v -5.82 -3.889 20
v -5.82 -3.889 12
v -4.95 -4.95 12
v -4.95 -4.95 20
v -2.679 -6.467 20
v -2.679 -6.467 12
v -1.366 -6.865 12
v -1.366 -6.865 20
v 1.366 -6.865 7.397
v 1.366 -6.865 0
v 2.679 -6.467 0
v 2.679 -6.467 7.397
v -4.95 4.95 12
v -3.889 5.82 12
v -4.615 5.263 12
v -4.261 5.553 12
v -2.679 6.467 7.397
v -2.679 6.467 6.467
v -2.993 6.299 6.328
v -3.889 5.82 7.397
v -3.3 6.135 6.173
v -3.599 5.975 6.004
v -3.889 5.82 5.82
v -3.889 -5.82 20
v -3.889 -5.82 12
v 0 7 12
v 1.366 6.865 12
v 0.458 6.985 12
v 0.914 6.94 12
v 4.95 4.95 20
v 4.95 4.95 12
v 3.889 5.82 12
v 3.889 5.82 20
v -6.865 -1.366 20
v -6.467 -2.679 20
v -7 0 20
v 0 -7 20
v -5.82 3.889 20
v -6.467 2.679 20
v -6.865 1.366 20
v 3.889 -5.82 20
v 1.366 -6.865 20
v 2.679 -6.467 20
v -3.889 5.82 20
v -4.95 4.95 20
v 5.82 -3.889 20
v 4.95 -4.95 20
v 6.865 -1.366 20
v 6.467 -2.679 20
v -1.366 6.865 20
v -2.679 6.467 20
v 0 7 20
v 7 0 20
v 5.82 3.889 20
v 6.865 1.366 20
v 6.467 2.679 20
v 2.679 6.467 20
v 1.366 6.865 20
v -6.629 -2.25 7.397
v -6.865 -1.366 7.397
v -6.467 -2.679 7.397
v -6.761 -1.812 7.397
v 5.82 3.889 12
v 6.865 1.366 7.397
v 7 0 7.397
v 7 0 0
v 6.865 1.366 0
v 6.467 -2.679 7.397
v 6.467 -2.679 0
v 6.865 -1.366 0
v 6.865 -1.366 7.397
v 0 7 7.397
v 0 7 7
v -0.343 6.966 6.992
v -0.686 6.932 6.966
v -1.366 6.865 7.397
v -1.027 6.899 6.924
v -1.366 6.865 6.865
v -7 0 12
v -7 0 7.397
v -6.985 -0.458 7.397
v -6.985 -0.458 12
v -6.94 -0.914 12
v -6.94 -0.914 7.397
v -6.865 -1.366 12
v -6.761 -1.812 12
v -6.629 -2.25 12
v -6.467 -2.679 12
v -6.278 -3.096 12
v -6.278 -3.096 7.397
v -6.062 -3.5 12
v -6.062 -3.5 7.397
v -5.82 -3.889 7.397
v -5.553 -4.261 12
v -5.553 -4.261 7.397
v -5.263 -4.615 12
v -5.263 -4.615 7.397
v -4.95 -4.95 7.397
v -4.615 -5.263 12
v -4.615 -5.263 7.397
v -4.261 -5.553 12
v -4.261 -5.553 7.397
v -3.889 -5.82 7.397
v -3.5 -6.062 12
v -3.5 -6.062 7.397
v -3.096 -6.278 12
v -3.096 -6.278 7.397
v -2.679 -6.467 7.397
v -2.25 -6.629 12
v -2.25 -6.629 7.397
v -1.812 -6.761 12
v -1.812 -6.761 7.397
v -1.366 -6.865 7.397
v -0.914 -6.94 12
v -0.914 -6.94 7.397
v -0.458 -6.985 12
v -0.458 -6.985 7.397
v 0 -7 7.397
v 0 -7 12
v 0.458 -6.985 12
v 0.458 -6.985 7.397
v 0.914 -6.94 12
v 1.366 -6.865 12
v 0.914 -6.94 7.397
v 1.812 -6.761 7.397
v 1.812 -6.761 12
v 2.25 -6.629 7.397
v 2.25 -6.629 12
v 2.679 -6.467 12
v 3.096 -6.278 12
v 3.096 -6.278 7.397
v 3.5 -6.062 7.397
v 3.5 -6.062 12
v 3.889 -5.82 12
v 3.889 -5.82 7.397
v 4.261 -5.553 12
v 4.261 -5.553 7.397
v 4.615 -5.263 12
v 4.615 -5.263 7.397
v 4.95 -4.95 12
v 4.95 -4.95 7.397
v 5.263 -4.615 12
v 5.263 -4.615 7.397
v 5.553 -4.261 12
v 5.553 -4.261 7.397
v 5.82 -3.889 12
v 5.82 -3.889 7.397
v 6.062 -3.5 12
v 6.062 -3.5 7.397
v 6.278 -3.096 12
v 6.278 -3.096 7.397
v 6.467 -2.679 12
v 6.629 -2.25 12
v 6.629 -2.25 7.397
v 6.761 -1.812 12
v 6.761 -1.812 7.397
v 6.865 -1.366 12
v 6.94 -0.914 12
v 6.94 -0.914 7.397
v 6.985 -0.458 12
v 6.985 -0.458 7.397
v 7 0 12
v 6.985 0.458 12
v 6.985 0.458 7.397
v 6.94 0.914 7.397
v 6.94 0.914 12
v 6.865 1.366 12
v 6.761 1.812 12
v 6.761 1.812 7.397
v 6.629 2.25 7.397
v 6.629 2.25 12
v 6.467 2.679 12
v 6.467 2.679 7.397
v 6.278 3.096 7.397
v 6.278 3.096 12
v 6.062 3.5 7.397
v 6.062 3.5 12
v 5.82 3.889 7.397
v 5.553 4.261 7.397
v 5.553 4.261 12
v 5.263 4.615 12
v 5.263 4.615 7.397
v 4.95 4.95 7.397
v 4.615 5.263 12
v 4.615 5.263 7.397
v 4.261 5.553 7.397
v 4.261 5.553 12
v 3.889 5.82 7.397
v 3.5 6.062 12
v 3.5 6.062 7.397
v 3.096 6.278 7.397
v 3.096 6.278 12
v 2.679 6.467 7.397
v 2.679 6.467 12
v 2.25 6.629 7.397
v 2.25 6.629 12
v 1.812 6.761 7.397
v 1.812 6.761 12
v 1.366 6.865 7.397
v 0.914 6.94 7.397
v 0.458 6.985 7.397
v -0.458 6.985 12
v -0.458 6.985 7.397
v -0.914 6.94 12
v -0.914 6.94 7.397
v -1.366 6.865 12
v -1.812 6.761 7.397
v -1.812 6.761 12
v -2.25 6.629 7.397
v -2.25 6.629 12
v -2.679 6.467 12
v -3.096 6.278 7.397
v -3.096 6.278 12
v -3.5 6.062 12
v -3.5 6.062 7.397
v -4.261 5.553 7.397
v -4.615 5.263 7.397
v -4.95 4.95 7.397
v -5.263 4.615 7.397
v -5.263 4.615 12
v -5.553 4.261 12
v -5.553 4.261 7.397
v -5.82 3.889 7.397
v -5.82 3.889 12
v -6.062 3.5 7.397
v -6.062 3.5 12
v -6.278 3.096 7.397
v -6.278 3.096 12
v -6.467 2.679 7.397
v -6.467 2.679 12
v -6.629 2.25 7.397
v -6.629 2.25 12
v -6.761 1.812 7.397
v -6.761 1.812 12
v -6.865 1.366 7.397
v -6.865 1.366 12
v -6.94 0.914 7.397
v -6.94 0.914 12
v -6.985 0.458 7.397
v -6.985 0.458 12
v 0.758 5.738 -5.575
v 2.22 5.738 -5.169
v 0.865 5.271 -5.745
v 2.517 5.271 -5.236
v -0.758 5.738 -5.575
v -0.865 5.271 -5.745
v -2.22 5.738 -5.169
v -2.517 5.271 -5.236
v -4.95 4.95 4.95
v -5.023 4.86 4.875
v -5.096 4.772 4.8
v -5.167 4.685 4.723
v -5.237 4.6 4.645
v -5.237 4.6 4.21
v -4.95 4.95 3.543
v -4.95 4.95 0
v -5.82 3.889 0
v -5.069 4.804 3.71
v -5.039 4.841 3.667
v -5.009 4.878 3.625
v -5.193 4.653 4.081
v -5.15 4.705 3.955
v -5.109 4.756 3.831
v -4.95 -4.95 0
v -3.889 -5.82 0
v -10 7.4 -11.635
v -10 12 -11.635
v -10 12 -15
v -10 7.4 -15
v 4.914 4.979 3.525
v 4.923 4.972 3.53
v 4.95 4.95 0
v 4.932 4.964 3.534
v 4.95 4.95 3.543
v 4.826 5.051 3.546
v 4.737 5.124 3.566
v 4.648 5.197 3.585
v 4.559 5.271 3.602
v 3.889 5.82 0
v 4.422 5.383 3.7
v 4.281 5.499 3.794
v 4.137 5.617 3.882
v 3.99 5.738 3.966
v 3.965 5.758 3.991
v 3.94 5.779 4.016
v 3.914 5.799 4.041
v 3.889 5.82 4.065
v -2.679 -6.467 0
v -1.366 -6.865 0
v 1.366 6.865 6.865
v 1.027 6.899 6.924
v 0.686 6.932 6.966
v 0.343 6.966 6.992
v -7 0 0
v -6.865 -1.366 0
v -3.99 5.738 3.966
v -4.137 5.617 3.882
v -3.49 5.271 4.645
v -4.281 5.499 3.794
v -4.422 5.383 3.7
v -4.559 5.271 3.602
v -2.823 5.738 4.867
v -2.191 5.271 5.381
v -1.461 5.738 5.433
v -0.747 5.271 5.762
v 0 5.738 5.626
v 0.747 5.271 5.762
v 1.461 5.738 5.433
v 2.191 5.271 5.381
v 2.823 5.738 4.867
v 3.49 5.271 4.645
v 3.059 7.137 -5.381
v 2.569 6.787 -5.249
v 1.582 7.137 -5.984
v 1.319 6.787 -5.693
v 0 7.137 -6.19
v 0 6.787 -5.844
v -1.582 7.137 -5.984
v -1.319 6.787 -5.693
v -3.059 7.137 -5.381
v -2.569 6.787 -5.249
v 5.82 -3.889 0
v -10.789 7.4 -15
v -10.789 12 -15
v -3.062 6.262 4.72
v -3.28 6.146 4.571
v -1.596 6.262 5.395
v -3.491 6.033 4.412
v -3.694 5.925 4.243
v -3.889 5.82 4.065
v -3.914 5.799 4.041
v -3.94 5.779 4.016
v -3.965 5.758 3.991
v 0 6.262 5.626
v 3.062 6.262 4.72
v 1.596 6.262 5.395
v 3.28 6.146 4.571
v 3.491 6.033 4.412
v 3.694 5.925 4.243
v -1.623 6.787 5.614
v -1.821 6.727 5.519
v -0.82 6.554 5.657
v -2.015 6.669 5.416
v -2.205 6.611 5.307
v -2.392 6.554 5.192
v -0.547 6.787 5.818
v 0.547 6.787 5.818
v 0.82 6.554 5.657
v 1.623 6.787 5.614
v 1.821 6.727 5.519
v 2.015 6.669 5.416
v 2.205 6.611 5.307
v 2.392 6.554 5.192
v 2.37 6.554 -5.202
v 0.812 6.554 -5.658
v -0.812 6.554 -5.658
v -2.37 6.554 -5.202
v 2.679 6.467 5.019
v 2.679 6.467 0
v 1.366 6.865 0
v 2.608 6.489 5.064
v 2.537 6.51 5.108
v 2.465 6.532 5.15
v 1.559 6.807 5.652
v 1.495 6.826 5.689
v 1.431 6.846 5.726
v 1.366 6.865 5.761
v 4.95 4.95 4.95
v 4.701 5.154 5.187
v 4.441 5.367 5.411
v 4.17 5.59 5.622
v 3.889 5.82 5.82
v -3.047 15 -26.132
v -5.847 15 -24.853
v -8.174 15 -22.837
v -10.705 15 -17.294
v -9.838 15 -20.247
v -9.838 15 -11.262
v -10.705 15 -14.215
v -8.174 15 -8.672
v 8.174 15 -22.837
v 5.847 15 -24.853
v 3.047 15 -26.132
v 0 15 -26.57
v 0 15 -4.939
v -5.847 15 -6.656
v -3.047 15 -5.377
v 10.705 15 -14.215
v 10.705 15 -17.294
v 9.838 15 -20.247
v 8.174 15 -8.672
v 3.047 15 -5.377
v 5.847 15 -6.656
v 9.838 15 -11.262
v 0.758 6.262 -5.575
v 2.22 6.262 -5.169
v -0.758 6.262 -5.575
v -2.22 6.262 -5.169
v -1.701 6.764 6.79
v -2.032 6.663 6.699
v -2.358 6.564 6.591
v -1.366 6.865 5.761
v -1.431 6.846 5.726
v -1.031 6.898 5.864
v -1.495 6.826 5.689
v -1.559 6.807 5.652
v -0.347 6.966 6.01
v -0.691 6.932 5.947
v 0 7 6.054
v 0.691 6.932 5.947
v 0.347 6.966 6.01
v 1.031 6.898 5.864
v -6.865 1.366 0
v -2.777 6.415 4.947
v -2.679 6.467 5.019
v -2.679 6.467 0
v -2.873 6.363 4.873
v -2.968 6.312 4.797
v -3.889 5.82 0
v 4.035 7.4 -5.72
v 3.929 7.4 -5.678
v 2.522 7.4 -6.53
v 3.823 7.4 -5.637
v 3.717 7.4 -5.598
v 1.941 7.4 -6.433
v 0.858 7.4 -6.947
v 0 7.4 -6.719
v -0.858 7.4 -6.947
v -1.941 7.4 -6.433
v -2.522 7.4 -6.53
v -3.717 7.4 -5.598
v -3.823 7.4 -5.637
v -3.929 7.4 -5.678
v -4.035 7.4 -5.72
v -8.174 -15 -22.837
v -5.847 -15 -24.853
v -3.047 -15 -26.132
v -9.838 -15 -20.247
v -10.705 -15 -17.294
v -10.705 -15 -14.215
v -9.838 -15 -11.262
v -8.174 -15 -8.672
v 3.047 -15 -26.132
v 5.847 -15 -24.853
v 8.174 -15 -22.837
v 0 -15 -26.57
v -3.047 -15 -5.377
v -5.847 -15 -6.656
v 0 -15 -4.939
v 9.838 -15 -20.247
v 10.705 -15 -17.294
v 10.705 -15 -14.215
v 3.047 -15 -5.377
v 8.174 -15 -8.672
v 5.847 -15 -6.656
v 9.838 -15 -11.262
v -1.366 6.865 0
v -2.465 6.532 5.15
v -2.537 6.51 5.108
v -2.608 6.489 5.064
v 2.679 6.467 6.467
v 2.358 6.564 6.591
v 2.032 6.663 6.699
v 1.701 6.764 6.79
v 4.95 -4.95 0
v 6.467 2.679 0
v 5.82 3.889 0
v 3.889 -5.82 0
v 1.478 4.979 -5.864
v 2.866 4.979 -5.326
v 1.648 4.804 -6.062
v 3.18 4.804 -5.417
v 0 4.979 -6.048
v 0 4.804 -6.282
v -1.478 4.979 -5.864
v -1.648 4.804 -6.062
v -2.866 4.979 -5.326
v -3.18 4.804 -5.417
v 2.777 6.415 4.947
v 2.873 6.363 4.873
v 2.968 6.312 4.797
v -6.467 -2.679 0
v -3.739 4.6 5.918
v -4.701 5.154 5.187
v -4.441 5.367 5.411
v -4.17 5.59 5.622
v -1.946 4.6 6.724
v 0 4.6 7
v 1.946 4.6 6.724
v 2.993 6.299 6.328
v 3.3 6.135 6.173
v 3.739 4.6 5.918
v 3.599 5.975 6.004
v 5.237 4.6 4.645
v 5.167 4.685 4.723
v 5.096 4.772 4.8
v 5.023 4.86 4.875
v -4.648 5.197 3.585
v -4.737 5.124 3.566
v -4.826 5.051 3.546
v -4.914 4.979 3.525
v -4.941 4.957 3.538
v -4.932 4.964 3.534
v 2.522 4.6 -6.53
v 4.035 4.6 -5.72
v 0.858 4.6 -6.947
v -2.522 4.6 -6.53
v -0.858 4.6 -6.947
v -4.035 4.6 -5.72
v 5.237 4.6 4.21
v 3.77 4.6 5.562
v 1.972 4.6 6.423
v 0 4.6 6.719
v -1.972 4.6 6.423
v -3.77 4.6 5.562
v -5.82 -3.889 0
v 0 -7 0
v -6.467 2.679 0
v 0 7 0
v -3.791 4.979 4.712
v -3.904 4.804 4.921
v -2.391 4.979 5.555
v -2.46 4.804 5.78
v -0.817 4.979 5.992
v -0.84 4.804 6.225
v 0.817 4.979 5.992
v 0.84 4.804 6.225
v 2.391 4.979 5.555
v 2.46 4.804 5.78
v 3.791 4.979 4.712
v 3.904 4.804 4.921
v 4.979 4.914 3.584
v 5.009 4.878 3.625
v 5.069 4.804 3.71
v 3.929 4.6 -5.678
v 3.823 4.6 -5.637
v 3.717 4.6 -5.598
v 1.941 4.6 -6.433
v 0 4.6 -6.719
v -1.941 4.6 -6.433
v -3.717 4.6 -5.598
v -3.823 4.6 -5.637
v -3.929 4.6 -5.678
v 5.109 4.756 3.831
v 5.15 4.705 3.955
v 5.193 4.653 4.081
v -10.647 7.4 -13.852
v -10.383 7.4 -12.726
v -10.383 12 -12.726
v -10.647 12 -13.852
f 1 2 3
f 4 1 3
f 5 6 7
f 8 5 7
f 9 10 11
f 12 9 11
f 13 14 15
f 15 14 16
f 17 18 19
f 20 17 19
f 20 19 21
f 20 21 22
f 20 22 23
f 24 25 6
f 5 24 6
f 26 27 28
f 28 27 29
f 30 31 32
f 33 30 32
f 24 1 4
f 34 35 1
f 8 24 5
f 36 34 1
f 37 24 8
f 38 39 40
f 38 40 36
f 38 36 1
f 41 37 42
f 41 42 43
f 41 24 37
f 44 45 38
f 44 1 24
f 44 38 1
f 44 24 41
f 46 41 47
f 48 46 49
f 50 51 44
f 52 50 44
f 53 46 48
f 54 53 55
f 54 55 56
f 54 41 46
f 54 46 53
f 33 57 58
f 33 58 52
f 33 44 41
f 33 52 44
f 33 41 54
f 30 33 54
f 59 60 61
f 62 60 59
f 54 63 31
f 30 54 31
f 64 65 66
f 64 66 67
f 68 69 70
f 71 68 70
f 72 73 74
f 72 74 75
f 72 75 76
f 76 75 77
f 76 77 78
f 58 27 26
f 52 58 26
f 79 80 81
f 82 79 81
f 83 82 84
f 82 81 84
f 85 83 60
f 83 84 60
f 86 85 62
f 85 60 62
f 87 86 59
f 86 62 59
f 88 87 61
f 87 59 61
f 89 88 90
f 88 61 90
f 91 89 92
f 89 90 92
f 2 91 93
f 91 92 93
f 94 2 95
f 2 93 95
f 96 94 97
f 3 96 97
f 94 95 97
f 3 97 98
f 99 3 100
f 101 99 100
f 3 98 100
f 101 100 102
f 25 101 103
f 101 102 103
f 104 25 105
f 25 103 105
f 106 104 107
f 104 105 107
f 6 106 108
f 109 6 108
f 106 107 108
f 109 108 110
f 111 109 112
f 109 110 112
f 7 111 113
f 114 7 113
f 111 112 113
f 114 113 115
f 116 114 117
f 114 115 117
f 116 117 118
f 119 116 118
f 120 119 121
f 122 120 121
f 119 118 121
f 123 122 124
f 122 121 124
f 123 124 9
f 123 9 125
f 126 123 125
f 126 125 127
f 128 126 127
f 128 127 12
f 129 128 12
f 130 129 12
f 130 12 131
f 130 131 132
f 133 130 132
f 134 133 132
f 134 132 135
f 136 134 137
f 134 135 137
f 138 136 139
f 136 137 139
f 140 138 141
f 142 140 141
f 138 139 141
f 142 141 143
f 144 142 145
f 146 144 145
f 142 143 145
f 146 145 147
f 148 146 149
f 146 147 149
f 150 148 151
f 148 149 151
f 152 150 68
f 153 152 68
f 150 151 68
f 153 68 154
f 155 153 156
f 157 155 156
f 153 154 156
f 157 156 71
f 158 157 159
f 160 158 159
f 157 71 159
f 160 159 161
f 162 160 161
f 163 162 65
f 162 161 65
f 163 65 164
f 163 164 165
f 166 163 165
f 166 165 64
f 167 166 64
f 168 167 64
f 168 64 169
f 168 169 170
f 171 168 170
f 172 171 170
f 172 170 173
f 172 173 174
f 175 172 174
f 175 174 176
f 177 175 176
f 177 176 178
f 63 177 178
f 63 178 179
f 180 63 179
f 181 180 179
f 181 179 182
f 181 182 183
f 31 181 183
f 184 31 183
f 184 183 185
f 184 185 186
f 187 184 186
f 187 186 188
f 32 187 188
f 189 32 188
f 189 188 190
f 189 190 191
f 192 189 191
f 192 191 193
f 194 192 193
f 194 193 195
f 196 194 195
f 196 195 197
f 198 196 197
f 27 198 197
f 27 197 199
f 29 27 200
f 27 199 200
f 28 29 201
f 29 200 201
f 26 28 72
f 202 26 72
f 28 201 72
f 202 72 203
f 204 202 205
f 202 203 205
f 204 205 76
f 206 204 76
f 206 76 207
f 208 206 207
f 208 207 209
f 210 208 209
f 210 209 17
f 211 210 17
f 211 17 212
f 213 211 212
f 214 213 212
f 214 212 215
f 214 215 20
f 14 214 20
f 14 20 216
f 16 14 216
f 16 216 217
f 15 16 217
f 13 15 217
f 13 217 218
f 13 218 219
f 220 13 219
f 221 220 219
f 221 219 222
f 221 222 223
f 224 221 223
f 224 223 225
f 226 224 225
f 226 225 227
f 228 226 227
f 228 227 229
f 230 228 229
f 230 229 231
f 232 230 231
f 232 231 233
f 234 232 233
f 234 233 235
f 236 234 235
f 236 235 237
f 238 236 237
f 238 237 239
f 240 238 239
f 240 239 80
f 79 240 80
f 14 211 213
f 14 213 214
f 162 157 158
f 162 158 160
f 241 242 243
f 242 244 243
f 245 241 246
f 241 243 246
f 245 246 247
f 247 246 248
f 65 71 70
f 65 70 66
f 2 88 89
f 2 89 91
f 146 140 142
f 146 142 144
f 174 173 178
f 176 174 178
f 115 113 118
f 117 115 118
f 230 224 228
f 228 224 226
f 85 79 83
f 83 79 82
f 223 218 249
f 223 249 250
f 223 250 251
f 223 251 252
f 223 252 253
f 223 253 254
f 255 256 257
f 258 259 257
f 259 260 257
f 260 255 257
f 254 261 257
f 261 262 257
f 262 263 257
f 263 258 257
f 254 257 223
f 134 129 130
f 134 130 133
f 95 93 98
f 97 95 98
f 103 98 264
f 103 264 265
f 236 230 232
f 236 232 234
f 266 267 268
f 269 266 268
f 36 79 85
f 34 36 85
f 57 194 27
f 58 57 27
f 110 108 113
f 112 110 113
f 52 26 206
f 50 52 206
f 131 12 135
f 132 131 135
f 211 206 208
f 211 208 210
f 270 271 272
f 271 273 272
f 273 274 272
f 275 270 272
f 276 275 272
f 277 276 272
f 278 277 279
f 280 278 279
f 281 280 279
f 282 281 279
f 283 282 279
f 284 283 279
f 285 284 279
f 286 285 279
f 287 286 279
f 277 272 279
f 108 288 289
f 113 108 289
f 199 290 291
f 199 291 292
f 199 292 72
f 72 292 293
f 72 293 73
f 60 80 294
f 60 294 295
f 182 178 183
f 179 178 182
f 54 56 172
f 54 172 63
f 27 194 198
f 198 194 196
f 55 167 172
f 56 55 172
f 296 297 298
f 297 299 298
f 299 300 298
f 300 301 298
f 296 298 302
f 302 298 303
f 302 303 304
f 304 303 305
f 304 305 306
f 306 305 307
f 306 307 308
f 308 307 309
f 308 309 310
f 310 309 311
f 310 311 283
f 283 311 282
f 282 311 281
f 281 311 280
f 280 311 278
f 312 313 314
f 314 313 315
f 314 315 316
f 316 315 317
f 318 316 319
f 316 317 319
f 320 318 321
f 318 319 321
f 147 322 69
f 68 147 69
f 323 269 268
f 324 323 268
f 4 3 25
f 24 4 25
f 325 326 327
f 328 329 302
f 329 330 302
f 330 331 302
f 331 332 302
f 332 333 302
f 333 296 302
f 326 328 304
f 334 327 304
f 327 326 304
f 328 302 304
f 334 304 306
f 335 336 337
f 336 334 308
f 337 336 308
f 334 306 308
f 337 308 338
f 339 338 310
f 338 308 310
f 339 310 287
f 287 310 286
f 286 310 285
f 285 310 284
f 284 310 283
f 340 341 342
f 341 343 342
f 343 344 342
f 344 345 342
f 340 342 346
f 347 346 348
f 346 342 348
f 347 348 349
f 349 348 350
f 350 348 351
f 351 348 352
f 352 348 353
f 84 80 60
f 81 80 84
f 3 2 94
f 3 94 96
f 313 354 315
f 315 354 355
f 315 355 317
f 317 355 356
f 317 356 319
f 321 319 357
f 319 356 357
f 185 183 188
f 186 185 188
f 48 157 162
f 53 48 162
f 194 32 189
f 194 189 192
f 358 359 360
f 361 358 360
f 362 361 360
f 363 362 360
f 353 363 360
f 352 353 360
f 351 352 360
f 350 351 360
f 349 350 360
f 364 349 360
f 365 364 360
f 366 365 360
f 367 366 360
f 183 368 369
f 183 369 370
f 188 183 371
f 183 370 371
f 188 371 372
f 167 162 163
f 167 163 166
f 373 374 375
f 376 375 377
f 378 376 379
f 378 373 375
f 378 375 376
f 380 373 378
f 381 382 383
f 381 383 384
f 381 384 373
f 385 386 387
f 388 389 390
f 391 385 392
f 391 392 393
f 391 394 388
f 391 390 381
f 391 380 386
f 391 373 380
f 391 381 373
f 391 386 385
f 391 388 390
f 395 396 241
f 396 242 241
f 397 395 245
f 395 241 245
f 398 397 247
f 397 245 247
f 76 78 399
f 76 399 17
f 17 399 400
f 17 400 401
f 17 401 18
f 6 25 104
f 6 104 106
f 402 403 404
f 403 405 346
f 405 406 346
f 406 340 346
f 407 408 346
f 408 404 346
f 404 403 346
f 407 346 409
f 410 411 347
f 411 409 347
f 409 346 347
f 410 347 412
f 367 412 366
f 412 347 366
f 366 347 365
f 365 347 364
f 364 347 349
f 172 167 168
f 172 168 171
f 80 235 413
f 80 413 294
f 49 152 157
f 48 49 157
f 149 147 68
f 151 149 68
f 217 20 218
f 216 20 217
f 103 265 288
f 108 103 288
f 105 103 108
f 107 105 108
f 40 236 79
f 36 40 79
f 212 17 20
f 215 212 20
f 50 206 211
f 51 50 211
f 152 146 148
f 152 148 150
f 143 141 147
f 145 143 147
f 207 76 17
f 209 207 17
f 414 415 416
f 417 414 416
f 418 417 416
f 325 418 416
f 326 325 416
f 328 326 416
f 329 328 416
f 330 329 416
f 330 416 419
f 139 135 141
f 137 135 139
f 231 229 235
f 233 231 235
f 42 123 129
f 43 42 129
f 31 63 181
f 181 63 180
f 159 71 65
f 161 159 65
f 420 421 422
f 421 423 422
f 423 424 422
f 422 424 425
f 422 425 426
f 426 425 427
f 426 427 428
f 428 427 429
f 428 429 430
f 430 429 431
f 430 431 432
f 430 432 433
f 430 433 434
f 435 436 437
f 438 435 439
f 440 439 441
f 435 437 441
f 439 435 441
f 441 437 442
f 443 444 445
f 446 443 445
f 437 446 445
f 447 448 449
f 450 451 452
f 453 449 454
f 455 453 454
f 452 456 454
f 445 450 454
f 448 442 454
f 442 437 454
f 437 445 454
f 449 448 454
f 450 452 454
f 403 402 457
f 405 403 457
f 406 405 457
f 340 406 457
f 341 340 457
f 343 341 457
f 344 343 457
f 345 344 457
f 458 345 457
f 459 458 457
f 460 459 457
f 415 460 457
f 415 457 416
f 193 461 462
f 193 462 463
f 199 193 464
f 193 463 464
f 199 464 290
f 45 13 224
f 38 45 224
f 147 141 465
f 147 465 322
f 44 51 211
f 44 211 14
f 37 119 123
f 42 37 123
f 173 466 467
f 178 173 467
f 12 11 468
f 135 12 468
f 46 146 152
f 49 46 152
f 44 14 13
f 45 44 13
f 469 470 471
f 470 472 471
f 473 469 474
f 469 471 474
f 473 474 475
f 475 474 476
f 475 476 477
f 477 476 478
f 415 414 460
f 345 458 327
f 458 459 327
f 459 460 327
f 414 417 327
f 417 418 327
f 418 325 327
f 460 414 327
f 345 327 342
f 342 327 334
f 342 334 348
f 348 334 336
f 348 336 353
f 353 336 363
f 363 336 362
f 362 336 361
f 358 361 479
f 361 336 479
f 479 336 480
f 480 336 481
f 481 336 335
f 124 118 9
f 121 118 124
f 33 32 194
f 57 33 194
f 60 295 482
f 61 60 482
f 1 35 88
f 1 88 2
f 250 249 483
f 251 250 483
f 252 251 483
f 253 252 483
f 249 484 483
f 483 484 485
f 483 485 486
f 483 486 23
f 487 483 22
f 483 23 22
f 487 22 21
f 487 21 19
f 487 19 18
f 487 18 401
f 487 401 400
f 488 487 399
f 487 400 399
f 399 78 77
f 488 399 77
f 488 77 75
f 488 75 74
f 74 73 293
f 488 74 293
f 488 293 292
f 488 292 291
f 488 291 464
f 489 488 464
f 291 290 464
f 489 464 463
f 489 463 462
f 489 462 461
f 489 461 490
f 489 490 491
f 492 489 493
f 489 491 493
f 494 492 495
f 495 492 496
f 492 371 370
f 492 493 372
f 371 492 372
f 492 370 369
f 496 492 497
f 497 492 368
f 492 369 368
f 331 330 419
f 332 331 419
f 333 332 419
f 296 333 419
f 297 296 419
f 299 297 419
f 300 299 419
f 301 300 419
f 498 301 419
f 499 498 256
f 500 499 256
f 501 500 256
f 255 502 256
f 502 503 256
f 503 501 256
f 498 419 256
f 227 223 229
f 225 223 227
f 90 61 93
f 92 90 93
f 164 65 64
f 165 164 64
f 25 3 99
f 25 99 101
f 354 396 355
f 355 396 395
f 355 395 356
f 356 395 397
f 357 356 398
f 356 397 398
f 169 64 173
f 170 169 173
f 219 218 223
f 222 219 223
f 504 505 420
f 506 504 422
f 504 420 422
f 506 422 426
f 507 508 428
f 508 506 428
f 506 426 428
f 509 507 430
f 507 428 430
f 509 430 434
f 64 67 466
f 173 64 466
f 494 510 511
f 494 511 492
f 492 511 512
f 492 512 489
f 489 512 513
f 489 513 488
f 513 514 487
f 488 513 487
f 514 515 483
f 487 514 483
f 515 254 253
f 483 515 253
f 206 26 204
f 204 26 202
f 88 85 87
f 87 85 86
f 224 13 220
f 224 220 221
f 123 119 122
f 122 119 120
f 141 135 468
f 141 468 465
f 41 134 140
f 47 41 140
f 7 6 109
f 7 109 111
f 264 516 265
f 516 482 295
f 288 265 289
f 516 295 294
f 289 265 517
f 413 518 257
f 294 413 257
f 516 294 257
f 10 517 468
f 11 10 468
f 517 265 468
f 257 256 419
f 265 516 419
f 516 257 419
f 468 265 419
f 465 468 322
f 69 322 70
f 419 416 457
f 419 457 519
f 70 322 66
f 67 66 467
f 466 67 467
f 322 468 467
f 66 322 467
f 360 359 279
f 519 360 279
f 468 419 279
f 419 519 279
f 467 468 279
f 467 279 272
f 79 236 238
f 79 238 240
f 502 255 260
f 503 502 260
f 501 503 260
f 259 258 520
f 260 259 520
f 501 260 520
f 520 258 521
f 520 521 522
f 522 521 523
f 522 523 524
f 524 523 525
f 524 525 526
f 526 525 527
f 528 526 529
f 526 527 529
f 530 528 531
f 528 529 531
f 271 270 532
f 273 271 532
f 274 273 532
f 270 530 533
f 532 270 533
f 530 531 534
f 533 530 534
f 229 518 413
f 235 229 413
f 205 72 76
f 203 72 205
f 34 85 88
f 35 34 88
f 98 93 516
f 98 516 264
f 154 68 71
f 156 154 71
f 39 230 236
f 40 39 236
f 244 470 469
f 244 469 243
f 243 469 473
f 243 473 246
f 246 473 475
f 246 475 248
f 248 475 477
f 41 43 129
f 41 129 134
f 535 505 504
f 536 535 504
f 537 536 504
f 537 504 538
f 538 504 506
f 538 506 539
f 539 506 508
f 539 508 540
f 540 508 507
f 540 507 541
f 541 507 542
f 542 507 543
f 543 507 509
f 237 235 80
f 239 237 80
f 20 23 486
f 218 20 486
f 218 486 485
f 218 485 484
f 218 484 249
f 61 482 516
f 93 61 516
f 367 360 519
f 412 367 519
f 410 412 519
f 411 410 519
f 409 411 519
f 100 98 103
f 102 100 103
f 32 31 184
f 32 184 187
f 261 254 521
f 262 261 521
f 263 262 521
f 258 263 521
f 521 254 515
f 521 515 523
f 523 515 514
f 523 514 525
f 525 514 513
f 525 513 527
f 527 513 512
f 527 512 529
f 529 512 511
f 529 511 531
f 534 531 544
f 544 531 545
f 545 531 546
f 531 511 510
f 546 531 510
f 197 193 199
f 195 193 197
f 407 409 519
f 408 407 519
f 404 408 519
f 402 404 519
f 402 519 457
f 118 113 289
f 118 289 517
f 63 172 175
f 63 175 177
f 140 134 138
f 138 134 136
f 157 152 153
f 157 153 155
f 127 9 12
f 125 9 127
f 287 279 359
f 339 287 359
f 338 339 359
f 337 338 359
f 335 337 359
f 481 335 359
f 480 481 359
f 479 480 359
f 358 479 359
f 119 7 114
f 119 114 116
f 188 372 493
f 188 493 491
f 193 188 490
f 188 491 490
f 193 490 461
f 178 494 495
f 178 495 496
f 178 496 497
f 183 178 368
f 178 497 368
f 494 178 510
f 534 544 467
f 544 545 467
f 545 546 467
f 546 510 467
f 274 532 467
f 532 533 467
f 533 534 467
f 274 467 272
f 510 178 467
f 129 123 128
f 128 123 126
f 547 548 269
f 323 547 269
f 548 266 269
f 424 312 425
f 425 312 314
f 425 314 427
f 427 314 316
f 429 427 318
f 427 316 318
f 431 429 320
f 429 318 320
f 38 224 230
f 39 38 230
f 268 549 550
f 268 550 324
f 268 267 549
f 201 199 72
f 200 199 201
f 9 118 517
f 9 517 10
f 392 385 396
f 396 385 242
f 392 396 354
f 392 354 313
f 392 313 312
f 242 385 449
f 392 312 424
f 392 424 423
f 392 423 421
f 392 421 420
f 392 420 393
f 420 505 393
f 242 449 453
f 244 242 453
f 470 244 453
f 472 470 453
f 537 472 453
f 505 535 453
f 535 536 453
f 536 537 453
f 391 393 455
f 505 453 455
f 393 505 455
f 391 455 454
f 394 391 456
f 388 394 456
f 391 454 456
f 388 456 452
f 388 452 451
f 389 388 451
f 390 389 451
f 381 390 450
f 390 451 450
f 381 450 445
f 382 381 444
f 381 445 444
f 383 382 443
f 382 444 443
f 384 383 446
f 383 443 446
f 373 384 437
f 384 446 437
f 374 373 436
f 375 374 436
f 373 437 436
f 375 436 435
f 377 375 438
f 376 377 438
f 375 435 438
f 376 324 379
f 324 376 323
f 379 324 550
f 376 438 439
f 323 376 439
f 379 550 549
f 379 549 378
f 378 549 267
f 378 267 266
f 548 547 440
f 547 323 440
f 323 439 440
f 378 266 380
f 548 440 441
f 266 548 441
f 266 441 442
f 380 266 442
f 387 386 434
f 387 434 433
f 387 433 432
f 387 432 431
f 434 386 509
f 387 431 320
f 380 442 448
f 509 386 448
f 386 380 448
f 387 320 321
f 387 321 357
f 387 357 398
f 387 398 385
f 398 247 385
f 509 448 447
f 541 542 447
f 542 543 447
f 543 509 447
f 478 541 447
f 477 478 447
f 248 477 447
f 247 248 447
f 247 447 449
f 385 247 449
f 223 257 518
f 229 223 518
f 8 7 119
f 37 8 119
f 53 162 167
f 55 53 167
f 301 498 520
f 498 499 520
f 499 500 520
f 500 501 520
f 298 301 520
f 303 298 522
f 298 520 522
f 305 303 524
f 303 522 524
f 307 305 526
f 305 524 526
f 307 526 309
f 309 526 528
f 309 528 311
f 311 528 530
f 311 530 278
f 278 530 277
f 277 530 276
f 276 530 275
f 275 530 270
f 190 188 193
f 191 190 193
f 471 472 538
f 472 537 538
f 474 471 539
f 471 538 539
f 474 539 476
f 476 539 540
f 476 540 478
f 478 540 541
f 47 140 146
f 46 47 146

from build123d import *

# Parameters (mm, degrees)
CADVIEW_CORE_EXTRUDE_DEPTH        = 20
CADVIEW_START                     = -15
CADVIEW_RESIDUAL_BOSS_PROFILE_1_R = 10.815419751
CADVIEW_RESIDUAL_BOSS_1_DEPTH     = 30
CADVIEW_START_2                   = -10
CADVIEW_RESIDUAL_CUT_PROFILE_2_W  = 30
CADVIEW_RESIDUAL_CUT_PROFILE_2_H  = 4.600000381
CADVIEW_RESIDUAL_CUT_2_DEPTH      = 20
CADVIEW_START_3                   = 7.396679878
CADVIEW_RESIDUAL_BOSS_PROFILE_3_R = 7.000000085
CADVIEW_RESIDUAL_BOSS_3_DEPTH     = 4.603320122


with BuildPart() as part:
    # CADView Core Profile → CADView Core Extrude (new body)
    with BuildSketch(Plane.XY):
        Polygon((-7, 0), (-6.865497112, -1.365632296), (-6.467156887, -2.678784132), (-5.820287228, -3.888991594), (-4.949747562, -4.949747562), (-3.888991594, -5.820287228), (-2.678784132, -6.467156887), (-1.365632296, -6.865497112), (0, -7), (1.365632296, -6.865497112), (2.678784132, -6.467156887), (3.888991594, -5.820287228), (4.949747562, -4.949747562), (5.820287228, -3.888991594), (6.467156887, -2.678784132), (6.865497112, -1.365632296), (7, 0), (6.865497112, 1.365632296), (6.467156887, 2.678784132), (5.820287228, 3.888991594), (4.949747562, 4.949747562), (3.888991594, 5.820287228), (2.678784132, 6.467156887), (1.365632296, 6.865497112), (0, 7), (-1.365632296, 6.865497112), (-2.678784132, 6.467156887), (-3.888991594, 5.820287228), (-4.949747562, 4.949747562), (-5.820287228, 3.888991594), (-6.467156887, 2.678784132), (-6.865497112, 1.365632296), align=None)
    extrude(amount=CADVIEW_CORE_EXTRUDE_DEPTH)

    # CADView Residual Boss Profile 3 → CADView Residual Boss 3 (add)
    with BuildSketch(Plane.XY.offset(CADVIEW_START_3)):
        with Locations(Location((0, 0, 0), (0, 0, 180))):
            Circle(CADVIEW_RESIDUAL_BOSS_PROFILE_3_R)
    extrude(amount=CADVIEW_RESIDUAL_BOSS_3_DEPTH)


with BuildPart() as body_2:
    # CADView Residual Boss Profile 1 → CADView Residual Boss 1 (new body)
    with BuildSketch(Plane(origin=(0, 0, 0), x_dir=(1, 0, 0), z_dir=(0, 1, 0)).offset(CADVIEW_START)):
        with Locations(Location((0, 15.754607839, 0), (0, 0, 270))):
            Circle(CADVIEW_RESIDUAL_BOSS_PROFILE_1_R)
    extrude(amount=CADVIEW_RESIDUAL_BOSS_1_DEPTH)

    # CADView Residual Cut Profile 2 → CADView Residual Cut 2 (cut)
    with BuildSketch(Plane(origin=(0, 0, 0), x_dir=(0, 0, -1), z_dir=(1, 0, 0)).offset(CADVIEW_START_2)):
        with Locations((0, 9.699999809)):
            Rectangle(CADVIEW_RESIDUAL_CUT_PROFILE_2_W, CADVIEW_RESIDUAL_CUT_PROFILE_2_H)
    extrude(amount=-CADVIEW_RESIDUAL_CUT_2_DEPTH, mode=Mode.SUBTRACT)


with BuildPart() as cadview_residual_revolve_cut_4_tool:
    # CADView Residual Revolve Cut Profile 4 → CADView Residual Revolve Cut 4 (revolve)
    with BuildSketch(Plane(origin=(0, 0, 0), x_dir=(0, 0, -1), z_dir=(1, 0, 0))):
        Polygon((7.000000188, 4.600000381), (7.000000188, 7.399999619), (6.719402111, 7.399999619), (6.189840539, 7.13749969), (5.843903878, 6.787499785), (5.716408503, 6.554166516), (5.625853783, 6.262499928), (5.625853783, 5.737500072), (5.809947921, 5.270833532), (6.047682267, 4.979166945), (6.281648991, 4.804166993), (6.719402111, 4.600000381), align=None)
    revolve(axis=Axis((0, 4.46000042, 0), (0, 1, 0)))


with BuildPart() as part_1:
    add(part.part)

    # CADView Residual Revolve Cut 4: cut by cadview_residual_revolve_cut_4_tool
    add(cadview_residual_revolve_cut_4_tool.part, mode=Mode.SUBTRACT)


with BuildPart() as body_2_1:
    add(body_2.part)

    # CADView Residual Revolve Cut 4: cut by cadview_residual_revolve_cut_4_tool
    add(cadview_residual_revolve_cut_4_tool.part, mode=Mode.SUBTRACT)


solid = Compound([part_1.part, body_2_1.part])
